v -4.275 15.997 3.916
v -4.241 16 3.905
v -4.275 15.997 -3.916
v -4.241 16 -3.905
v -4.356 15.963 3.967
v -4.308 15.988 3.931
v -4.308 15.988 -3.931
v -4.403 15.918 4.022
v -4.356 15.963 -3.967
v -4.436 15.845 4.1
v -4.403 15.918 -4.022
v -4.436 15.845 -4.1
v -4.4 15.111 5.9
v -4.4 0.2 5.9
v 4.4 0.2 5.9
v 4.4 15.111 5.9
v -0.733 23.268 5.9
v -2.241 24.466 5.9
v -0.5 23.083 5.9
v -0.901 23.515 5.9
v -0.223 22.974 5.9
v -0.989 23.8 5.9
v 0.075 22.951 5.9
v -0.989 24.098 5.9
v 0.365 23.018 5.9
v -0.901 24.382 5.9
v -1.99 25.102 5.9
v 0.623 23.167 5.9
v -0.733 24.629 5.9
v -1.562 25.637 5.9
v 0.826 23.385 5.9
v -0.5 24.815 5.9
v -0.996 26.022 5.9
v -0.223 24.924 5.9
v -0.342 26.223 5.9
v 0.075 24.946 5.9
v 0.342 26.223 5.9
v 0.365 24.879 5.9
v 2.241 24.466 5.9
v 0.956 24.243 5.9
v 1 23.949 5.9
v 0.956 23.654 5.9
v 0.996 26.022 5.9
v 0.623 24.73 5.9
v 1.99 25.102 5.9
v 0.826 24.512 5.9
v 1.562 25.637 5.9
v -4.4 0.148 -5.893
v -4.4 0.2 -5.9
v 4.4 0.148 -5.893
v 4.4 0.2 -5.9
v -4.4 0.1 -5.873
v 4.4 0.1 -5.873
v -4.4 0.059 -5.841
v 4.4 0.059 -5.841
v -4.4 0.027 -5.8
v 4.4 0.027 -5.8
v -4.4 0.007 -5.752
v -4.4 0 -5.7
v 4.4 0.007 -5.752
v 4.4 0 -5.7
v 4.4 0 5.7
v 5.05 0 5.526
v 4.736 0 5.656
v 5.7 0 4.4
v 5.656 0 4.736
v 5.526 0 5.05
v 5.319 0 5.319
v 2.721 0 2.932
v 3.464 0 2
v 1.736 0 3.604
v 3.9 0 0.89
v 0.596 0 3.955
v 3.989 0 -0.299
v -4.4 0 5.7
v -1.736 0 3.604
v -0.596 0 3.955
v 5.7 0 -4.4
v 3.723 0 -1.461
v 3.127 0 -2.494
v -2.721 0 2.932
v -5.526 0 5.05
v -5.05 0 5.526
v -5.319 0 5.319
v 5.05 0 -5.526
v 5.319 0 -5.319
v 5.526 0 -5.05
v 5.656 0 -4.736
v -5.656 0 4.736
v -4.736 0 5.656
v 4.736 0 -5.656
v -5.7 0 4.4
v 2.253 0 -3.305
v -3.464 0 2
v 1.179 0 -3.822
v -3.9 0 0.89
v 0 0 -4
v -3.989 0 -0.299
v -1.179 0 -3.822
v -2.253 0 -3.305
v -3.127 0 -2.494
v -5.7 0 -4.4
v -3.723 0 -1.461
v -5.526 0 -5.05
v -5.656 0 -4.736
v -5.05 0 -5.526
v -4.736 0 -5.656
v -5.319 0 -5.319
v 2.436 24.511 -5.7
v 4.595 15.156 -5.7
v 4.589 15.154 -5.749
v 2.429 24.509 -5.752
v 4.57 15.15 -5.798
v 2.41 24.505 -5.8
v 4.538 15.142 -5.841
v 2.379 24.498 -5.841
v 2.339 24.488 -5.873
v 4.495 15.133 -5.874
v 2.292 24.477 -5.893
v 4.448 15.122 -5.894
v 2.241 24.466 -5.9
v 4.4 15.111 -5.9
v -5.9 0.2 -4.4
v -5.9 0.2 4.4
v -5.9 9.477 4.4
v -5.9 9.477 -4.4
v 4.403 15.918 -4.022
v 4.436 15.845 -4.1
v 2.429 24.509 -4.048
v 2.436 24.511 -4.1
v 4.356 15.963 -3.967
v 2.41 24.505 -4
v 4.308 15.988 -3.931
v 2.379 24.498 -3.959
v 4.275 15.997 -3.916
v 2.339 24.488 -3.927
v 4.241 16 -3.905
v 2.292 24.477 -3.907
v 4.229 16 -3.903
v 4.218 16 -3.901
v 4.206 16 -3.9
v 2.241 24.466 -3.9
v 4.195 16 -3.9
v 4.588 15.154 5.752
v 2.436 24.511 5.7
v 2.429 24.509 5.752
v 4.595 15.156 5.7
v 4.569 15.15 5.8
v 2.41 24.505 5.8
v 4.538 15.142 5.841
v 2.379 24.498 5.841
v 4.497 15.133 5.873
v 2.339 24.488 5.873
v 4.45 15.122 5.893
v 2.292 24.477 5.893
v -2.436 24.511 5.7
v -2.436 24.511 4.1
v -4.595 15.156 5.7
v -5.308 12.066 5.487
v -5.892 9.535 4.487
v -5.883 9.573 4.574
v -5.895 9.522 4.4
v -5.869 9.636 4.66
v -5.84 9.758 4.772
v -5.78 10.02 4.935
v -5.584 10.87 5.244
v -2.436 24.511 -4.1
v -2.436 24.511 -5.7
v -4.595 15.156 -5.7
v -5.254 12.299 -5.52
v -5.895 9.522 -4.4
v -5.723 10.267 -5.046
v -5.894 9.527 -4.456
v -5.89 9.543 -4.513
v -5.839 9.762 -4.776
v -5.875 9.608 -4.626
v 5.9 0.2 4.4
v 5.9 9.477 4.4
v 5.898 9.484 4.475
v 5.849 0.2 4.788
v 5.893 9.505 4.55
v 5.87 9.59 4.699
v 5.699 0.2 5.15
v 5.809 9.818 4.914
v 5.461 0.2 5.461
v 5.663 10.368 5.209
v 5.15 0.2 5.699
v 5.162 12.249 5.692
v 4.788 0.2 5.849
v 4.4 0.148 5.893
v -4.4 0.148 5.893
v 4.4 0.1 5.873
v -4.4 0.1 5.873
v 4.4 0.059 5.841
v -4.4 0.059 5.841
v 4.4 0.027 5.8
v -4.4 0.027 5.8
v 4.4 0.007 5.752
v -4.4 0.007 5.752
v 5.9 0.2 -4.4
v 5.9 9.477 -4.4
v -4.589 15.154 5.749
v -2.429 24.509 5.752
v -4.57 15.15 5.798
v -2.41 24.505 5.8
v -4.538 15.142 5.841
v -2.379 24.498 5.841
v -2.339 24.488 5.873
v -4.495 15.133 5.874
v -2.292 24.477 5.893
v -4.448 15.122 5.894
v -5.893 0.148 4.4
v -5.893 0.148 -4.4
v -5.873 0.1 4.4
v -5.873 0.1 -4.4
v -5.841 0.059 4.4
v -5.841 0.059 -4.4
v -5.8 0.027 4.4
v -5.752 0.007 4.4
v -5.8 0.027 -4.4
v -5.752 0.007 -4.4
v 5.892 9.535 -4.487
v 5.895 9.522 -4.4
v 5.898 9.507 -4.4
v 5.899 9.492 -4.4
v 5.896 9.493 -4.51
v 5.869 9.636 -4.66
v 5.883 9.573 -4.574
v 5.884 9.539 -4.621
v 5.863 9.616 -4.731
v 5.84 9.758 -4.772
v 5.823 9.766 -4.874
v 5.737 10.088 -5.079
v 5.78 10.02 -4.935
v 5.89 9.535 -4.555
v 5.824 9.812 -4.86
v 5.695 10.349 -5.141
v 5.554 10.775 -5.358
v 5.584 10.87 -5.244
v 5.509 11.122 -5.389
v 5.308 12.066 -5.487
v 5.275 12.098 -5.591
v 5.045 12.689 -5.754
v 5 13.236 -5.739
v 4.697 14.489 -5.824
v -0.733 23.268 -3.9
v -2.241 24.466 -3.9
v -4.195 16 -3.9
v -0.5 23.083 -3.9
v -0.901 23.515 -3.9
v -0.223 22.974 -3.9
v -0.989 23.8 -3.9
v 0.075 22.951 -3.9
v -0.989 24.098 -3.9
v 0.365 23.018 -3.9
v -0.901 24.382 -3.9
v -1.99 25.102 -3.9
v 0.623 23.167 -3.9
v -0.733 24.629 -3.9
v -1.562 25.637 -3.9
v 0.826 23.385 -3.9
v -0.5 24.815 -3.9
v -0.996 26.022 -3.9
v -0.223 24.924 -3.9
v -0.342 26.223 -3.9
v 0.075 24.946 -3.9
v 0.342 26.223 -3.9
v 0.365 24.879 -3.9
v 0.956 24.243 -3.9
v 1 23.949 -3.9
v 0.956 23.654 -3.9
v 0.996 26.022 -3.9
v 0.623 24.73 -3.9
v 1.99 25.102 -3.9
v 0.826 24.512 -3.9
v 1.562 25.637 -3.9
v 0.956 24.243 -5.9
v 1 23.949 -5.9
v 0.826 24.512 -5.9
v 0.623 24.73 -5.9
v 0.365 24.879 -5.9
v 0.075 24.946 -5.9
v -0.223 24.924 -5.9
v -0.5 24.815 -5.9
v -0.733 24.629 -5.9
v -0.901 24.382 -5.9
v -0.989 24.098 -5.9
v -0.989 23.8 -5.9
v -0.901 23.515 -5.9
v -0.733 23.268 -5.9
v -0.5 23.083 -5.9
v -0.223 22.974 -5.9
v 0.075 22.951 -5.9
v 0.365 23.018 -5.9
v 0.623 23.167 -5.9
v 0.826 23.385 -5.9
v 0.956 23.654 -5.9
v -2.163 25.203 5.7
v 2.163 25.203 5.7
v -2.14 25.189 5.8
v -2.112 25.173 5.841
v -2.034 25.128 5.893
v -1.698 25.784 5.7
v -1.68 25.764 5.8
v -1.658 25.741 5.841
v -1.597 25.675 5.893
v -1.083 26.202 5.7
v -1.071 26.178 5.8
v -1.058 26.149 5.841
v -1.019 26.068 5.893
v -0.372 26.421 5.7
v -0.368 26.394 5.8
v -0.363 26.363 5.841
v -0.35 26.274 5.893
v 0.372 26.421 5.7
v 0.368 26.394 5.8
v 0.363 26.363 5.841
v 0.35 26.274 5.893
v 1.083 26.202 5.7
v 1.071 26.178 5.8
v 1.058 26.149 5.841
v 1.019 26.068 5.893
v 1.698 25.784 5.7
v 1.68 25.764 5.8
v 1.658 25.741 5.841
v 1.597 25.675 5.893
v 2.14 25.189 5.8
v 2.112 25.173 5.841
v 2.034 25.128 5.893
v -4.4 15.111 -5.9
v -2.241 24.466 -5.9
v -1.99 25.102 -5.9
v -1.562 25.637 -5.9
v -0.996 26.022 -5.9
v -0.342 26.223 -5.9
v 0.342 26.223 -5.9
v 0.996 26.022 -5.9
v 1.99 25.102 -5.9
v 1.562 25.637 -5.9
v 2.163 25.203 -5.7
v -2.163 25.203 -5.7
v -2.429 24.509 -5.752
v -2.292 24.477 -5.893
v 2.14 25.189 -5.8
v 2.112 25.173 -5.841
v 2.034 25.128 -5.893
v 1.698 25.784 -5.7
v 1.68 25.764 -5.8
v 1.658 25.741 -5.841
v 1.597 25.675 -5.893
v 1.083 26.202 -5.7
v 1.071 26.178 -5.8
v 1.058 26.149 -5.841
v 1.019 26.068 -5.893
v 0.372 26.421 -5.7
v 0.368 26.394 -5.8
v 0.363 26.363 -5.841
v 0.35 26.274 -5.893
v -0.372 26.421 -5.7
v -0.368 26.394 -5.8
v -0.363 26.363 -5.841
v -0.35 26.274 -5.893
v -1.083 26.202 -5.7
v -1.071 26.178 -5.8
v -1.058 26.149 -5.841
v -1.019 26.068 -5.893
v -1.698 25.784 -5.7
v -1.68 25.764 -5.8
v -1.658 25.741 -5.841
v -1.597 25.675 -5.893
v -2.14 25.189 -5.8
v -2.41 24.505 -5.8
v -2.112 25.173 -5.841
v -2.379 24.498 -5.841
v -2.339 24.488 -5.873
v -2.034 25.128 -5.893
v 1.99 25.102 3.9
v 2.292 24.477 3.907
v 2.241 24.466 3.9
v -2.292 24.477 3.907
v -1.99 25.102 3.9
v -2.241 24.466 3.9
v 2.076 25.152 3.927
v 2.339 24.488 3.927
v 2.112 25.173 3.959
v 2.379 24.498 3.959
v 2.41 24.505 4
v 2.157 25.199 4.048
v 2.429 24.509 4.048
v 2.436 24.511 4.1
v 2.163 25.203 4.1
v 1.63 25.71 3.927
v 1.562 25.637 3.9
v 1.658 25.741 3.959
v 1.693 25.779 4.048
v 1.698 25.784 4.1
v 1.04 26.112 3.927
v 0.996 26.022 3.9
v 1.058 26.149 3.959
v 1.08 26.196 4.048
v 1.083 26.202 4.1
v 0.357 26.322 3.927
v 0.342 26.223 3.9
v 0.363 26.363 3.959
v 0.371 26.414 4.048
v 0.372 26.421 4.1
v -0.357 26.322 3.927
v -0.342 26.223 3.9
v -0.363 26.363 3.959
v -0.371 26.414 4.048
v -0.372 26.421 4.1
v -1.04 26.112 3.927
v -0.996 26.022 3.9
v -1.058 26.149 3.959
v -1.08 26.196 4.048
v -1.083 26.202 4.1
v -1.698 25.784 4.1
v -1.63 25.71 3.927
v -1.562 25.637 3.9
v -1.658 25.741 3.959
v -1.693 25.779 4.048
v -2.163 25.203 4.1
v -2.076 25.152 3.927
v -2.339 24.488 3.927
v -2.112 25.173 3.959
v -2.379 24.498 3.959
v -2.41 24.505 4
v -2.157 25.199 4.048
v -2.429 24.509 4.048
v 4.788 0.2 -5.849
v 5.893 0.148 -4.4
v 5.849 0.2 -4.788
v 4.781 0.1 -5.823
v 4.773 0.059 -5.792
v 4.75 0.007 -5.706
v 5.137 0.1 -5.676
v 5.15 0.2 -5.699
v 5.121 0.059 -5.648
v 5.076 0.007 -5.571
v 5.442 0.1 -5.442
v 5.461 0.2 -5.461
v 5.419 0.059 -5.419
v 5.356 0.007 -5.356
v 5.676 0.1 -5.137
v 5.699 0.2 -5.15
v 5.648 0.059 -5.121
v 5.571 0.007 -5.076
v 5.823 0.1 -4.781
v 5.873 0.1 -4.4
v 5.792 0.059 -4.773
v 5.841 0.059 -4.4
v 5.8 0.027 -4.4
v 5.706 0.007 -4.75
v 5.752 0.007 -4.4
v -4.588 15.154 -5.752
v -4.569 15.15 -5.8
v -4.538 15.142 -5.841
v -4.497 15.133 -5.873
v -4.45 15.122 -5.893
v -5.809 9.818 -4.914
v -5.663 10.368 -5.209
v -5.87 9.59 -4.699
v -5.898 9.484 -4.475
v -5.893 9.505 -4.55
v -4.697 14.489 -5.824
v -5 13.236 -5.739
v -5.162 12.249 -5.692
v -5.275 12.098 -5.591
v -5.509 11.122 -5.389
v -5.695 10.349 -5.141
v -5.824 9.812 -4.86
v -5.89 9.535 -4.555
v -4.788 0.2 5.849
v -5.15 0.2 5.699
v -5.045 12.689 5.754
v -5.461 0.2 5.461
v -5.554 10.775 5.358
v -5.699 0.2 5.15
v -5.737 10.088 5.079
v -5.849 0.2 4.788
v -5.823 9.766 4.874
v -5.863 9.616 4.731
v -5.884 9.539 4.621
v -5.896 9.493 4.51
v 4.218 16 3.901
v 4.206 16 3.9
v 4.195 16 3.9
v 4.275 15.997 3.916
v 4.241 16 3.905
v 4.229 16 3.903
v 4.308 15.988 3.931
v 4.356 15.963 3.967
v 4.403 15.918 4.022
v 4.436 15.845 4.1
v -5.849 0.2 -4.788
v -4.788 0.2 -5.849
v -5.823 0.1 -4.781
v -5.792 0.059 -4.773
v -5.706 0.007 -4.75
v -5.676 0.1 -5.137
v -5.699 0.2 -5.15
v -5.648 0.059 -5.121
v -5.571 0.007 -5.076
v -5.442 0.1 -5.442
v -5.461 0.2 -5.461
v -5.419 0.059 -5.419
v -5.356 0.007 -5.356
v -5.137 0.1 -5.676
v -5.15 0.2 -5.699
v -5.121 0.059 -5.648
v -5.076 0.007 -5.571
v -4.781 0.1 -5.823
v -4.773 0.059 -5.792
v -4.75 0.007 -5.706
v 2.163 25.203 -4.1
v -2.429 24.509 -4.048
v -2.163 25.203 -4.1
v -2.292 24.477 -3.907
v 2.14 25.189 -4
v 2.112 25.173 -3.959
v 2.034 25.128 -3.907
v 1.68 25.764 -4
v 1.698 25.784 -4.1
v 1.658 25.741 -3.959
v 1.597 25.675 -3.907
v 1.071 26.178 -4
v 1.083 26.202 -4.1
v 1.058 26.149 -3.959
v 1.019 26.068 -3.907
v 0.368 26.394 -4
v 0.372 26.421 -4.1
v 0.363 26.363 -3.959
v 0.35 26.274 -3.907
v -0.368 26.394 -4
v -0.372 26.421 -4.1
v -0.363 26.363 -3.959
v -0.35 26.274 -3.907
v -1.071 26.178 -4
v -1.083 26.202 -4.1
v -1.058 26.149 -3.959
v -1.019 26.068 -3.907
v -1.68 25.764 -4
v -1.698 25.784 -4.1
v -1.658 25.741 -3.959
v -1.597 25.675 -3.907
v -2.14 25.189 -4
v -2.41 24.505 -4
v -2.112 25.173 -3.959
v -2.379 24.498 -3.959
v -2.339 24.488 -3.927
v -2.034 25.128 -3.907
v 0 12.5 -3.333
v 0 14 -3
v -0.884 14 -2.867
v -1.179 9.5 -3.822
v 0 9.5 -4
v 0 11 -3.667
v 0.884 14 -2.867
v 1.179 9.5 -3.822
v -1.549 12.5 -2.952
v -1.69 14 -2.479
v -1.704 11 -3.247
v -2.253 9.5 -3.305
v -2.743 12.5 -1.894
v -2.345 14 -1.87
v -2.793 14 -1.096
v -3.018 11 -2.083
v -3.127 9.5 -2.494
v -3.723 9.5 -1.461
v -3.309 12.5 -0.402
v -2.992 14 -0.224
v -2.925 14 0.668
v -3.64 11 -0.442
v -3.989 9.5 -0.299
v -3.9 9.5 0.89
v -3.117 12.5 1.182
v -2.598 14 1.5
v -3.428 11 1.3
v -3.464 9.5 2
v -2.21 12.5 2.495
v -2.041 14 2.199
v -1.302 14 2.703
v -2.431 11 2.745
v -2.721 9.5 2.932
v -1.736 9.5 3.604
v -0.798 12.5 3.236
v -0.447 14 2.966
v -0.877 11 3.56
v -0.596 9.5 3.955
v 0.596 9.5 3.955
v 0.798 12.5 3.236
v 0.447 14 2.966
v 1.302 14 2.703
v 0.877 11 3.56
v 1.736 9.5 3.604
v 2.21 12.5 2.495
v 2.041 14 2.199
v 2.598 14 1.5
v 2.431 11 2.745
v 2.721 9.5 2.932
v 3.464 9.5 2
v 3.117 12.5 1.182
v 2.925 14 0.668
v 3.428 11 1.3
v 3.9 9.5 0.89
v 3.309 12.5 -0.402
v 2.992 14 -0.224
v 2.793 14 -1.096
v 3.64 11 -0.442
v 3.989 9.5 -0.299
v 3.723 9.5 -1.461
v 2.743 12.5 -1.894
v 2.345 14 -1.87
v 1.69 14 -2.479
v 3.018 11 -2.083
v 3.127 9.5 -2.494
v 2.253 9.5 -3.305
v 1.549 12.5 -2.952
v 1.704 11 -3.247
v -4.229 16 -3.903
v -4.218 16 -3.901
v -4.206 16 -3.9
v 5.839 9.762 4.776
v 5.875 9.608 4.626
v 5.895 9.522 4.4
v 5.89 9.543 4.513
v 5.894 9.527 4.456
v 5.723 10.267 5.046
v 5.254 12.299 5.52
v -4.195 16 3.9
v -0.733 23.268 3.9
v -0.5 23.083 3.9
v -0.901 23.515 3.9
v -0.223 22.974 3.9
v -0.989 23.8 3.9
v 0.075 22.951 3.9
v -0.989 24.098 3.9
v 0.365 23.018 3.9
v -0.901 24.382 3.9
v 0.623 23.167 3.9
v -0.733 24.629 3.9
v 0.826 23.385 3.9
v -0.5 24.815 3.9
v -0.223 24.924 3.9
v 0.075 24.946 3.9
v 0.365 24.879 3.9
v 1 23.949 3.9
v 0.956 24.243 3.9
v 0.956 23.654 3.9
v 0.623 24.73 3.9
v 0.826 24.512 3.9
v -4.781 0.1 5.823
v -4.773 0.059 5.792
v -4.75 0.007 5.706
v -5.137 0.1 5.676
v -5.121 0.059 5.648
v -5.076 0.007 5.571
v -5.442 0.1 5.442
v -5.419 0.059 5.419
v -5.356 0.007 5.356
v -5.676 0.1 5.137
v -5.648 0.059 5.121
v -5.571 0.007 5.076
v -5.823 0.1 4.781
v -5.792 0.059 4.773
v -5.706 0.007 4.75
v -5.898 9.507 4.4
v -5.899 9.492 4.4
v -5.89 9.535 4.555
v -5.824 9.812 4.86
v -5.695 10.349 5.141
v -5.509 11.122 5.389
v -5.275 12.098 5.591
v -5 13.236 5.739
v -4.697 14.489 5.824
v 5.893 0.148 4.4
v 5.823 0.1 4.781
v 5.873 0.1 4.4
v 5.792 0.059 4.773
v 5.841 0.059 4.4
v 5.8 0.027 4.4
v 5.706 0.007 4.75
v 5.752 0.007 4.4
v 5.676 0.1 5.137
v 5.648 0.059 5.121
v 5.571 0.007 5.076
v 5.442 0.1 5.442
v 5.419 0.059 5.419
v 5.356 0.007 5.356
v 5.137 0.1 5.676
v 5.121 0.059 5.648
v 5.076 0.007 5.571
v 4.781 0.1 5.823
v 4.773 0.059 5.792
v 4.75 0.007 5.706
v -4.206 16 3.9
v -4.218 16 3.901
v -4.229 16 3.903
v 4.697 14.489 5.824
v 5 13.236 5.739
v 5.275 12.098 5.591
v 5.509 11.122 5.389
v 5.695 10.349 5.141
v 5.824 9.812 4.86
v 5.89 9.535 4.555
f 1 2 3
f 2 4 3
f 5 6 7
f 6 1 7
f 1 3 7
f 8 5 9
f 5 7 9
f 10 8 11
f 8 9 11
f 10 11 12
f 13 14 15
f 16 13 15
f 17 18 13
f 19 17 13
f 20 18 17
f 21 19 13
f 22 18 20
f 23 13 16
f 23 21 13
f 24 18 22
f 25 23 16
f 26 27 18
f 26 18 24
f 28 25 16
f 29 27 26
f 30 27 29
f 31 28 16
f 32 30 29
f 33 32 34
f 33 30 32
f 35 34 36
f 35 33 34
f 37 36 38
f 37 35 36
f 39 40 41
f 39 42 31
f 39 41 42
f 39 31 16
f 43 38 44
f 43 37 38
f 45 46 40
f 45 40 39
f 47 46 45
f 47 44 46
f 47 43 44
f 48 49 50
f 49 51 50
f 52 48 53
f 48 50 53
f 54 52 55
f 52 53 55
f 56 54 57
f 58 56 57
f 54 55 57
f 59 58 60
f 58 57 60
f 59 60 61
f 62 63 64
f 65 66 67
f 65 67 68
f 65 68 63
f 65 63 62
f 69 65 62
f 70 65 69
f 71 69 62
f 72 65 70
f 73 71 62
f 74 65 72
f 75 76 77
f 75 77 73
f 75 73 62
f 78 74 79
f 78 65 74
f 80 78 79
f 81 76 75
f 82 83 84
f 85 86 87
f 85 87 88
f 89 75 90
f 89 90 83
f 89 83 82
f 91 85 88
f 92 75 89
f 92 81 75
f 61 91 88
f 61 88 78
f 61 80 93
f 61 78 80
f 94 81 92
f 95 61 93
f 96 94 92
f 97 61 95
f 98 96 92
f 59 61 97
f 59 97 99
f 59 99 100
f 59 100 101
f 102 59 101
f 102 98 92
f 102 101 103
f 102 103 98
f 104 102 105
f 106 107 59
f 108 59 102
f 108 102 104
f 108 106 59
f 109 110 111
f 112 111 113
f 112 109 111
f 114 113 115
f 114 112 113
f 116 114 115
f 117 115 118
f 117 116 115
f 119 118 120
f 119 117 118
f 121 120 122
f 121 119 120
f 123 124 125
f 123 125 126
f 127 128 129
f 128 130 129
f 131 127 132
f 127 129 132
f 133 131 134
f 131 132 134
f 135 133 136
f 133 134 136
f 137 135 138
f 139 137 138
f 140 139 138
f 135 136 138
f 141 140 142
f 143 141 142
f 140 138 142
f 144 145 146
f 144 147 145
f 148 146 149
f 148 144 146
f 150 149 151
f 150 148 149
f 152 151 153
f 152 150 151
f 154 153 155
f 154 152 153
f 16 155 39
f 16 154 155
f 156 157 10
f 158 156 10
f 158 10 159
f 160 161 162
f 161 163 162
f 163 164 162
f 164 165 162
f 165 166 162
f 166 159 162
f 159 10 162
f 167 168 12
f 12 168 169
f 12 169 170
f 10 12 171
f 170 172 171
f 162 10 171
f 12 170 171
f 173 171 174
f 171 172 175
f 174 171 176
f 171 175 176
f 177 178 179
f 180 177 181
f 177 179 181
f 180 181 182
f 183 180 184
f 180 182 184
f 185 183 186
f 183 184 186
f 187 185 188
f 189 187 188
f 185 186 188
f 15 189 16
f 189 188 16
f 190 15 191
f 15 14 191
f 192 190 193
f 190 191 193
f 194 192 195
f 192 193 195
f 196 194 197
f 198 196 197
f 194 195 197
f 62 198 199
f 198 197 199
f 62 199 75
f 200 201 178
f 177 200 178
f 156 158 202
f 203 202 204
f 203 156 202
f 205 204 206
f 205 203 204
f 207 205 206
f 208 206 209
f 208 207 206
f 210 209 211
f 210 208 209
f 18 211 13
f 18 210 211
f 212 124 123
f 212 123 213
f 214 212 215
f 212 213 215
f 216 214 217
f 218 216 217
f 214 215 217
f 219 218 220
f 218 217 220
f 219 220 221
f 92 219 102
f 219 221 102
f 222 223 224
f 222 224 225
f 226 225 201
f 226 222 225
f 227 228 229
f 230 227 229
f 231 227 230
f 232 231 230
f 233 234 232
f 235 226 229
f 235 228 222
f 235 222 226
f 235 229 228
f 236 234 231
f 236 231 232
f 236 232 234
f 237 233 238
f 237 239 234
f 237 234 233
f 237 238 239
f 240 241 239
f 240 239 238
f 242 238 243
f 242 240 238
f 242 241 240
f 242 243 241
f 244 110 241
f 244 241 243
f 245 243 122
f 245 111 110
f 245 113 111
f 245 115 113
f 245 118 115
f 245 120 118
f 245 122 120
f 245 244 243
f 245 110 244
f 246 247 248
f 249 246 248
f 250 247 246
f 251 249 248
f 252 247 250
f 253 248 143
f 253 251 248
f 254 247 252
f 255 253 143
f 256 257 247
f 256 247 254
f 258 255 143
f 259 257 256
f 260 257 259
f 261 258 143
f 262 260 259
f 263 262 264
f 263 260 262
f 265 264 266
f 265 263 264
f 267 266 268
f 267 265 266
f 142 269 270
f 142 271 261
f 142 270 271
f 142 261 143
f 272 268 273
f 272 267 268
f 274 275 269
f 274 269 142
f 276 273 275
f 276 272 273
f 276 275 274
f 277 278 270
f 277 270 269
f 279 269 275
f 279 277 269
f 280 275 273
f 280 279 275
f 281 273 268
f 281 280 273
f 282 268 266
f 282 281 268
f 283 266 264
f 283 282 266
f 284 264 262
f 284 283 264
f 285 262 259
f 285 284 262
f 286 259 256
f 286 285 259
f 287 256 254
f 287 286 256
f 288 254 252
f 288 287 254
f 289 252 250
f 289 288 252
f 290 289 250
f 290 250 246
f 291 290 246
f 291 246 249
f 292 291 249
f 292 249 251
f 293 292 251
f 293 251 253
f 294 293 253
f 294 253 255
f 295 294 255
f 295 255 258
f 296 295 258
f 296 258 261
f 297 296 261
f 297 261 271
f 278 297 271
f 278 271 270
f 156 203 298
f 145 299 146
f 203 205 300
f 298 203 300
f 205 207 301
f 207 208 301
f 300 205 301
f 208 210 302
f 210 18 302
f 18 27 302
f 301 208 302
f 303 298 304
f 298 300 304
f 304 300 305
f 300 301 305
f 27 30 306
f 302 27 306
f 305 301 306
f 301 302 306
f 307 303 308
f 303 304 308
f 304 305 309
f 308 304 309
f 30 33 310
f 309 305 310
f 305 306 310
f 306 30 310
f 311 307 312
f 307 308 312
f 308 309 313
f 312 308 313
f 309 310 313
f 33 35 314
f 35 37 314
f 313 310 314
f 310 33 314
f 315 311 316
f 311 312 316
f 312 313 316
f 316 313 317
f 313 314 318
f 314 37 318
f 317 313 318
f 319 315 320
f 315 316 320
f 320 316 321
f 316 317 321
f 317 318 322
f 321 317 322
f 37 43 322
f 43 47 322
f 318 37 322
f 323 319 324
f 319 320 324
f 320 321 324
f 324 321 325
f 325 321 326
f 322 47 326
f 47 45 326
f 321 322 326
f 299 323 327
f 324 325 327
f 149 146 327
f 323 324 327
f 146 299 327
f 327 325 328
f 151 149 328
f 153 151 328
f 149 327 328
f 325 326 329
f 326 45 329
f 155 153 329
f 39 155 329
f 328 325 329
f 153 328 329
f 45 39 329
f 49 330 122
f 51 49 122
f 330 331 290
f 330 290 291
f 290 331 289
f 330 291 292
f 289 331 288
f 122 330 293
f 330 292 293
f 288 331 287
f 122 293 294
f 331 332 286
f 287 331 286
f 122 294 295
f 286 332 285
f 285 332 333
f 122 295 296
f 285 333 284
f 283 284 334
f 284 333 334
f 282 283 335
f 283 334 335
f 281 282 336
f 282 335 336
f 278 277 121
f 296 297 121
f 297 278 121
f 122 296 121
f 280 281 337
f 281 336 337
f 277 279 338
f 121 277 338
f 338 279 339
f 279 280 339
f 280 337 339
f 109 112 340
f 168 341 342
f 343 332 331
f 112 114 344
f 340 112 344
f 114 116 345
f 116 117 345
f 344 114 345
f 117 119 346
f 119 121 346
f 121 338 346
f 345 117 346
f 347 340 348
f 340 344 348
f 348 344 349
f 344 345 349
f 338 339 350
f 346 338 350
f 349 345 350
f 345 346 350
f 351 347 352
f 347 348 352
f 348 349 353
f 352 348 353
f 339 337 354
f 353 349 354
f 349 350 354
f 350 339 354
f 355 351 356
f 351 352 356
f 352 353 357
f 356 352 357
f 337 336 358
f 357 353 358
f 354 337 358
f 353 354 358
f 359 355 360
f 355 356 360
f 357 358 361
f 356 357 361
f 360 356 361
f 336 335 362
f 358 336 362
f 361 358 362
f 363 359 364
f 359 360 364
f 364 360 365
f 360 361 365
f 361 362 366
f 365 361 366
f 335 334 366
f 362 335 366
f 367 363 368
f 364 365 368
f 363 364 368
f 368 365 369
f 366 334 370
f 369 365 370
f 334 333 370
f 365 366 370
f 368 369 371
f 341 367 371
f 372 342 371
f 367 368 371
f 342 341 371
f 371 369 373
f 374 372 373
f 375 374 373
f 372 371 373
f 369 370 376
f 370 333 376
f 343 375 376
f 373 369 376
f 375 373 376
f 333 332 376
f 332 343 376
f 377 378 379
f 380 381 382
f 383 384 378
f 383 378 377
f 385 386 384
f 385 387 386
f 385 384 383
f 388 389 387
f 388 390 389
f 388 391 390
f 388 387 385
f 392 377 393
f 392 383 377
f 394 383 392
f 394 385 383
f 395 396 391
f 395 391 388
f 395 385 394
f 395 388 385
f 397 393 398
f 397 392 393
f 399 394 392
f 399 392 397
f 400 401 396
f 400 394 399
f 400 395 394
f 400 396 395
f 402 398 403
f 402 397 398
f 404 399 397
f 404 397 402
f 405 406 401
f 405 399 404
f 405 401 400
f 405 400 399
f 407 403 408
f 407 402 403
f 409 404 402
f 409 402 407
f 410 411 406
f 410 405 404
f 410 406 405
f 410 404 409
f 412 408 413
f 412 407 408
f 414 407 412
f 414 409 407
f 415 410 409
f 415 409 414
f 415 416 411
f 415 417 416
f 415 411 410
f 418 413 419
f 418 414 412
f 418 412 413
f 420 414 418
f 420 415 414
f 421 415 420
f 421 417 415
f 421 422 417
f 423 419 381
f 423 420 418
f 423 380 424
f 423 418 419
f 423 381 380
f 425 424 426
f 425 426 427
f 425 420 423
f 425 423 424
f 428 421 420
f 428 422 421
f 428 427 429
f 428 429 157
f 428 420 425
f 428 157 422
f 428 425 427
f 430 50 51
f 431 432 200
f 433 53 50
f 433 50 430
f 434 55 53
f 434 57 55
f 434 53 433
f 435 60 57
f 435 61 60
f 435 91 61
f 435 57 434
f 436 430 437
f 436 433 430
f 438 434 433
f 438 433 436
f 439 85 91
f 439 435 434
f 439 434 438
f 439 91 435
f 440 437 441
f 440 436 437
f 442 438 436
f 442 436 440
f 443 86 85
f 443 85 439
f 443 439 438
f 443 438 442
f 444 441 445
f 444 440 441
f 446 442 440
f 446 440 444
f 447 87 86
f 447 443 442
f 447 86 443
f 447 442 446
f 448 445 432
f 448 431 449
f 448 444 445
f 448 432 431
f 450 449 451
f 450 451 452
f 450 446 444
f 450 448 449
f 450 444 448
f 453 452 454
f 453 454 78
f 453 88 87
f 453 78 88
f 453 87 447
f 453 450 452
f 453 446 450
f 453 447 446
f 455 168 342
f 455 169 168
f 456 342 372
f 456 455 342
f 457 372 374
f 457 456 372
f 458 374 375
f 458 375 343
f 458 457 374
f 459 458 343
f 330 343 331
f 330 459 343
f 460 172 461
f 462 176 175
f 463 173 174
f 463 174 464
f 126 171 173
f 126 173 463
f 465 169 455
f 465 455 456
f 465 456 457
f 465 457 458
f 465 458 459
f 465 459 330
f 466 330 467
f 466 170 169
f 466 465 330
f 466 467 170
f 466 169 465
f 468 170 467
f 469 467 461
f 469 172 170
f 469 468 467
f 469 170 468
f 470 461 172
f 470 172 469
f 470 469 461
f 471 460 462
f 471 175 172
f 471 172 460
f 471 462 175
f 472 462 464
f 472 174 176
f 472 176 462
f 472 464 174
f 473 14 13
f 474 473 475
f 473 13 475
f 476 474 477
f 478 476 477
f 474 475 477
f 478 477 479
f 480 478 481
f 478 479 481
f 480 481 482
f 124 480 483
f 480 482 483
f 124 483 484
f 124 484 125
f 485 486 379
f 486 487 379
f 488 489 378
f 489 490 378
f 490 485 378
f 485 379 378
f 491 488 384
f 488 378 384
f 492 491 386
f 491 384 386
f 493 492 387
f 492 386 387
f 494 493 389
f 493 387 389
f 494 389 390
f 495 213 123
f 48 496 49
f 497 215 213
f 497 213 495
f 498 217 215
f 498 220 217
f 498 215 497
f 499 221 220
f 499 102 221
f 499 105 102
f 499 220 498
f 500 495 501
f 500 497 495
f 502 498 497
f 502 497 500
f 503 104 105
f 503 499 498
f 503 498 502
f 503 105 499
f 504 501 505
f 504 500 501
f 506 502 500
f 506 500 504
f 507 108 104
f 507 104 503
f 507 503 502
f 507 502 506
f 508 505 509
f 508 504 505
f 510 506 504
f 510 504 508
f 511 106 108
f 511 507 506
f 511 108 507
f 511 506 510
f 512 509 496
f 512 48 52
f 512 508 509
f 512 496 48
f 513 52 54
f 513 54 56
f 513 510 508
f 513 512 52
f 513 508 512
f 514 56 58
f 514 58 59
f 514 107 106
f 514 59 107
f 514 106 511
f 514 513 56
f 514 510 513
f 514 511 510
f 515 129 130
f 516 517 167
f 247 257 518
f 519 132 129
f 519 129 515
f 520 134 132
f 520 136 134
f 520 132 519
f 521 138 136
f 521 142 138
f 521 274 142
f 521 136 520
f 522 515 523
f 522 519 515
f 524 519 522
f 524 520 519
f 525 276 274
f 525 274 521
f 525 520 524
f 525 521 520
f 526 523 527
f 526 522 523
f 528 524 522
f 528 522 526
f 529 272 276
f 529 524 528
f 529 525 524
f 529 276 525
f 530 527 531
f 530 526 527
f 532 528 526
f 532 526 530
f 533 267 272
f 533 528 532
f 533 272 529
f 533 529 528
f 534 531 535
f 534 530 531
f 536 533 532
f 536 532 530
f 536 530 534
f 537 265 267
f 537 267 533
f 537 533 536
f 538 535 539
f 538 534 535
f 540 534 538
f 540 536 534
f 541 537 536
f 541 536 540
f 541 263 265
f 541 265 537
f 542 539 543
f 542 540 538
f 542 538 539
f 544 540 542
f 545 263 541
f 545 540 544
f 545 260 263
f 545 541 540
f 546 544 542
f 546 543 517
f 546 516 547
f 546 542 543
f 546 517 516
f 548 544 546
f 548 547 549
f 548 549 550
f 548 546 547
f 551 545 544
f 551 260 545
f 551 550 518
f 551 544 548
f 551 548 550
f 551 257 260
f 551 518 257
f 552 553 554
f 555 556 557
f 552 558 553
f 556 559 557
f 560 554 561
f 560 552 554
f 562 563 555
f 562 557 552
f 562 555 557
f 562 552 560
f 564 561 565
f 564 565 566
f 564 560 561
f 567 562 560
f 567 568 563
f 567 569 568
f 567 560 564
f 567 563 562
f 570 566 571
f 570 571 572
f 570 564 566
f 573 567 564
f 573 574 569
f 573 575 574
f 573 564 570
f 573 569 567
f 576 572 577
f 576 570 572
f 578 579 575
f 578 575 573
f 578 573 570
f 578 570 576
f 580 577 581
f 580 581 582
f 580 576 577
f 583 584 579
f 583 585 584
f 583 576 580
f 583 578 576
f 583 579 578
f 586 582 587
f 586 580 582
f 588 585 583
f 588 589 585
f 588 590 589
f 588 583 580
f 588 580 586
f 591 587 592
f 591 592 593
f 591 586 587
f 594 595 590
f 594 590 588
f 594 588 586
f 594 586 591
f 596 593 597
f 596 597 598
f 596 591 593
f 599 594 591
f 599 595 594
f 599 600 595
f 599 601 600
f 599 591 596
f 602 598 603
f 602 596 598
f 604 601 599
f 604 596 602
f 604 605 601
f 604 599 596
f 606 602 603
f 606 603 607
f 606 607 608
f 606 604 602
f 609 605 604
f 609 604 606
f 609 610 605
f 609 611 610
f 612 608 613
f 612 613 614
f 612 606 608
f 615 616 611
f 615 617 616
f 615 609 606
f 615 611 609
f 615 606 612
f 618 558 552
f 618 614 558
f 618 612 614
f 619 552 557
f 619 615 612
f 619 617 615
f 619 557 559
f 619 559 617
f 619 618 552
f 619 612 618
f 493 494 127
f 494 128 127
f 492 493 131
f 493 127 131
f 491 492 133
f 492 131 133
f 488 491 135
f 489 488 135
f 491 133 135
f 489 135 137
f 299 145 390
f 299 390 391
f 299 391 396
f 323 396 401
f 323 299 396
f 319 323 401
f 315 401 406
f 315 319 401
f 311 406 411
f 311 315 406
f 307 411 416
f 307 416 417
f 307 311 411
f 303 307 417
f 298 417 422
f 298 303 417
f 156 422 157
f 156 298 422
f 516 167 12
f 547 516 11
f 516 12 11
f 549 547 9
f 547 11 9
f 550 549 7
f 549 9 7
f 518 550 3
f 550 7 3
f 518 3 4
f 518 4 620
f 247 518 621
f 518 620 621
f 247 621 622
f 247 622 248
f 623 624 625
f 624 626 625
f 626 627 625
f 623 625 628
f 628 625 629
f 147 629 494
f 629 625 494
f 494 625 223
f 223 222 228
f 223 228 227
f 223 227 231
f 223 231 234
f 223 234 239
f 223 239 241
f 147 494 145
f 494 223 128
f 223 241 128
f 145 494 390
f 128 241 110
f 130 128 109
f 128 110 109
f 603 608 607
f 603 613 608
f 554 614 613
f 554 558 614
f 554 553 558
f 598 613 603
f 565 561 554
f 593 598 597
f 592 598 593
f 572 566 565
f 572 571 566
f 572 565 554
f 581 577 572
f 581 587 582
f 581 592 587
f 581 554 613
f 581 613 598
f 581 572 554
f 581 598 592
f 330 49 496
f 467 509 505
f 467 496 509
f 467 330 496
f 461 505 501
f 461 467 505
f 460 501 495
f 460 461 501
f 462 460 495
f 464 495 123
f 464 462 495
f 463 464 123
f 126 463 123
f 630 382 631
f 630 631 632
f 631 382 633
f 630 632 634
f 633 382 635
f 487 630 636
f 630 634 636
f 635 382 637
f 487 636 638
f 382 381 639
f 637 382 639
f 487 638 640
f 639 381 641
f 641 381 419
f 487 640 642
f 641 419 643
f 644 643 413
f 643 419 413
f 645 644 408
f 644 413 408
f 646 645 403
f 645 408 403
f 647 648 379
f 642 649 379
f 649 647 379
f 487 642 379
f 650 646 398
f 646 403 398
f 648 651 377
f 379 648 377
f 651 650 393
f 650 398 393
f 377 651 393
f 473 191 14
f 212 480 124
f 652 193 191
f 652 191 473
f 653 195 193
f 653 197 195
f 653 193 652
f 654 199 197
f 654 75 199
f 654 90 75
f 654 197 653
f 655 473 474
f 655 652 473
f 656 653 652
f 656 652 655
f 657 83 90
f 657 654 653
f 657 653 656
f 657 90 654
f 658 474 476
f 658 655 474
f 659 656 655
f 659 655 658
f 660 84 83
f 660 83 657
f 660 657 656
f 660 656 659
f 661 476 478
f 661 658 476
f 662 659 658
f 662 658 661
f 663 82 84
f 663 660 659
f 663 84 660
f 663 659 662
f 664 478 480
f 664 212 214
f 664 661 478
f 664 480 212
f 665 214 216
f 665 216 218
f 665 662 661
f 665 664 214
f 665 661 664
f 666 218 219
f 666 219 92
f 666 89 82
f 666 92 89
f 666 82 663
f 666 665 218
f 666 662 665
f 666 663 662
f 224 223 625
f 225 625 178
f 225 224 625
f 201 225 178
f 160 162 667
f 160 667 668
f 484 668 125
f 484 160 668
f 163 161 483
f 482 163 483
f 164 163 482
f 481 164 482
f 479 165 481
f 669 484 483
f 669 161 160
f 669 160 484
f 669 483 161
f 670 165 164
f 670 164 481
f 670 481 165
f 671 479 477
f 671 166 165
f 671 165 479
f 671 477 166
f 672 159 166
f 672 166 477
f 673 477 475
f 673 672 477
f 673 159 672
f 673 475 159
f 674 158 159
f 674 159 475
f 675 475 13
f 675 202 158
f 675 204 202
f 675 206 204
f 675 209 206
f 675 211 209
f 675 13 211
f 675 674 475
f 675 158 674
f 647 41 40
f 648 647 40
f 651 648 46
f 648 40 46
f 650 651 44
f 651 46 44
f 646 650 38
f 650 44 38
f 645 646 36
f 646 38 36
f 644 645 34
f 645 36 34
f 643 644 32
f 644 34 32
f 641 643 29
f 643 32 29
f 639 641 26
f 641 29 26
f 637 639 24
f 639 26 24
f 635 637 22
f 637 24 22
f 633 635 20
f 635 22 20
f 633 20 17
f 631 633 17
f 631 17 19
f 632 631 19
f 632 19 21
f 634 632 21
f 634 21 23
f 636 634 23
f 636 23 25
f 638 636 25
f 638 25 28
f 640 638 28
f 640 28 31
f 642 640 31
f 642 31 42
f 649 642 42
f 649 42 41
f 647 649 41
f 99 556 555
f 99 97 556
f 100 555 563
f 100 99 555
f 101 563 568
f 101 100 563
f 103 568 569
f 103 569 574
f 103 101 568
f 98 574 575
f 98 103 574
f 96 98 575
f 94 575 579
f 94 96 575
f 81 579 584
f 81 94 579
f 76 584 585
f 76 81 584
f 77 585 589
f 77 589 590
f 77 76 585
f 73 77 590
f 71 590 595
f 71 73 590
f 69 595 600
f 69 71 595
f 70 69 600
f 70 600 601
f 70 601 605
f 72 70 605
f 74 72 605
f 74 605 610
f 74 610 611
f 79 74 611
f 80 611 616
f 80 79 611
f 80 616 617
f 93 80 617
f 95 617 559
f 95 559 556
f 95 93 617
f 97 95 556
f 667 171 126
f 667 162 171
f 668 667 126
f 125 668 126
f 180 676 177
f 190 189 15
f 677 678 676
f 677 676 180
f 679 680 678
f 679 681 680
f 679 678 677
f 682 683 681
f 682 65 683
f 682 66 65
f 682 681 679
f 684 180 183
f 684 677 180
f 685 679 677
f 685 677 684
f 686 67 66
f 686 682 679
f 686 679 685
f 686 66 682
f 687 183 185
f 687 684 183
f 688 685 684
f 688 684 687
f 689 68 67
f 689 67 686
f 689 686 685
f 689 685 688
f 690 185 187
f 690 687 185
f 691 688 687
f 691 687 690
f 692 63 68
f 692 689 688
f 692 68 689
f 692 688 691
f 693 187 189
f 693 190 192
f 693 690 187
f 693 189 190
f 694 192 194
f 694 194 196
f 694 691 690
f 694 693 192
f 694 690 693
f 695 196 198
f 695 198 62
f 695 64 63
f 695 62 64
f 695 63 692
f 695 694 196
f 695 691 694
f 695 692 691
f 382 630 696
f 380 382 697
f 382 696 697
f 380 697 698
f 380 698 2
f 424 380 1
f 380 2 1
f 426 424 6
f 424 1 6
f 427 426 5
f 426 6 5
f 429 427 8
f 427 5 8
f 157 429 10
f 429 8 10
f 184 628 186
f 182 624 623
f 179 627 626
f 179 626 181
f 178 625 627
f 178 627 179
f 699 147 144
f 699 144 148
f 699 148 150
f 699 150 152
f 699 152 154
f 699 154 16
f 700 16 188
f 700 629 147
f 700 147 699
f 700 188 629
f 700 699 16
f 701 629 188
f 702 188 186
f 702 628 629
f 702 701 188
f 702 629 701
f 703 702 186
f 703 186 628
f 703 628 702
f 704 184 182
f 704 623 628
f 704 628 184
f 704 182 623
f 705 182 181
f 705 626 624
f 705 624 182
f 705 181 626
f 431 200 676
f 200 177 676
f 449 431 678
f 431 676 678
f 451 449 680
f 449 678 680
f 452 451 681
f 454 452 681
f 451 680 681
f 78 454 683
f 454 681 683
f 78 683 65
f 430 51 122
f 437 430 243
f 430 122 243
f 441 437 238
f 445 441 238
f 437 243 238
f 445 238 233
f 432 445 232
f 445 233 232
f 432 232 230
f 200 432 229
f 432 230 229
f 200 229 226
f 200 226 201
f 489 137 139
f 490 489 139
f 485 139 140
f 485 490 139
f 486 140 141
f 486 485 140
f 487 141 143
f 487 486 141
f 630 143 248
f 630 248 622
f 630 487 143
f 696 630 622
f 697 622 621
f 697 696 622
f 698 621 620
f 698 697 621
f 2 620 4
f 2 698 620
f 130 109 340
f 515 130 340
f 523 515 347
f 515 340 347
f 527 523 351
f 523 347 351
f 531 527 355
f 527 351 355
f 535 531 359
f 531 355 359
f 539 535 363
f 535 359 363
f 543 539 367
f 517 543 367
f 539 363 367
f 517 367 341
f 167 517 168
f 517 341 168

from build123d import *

# Parameters (mm, degrees)
EXTRUDE_1_DEPTH     = 9.5
EXTRUDE_2_DEPTH     = 11.8
EXTRUDE_3_DEPTH     = 2
CUT_EXTRUDE_1_REACH = 31.556
SKETCH_4_R          = 1.0000000000000002
FILLET_1_R          = 1.5
FILLET_2_R          = 0.2


with BuildPart() as part:
    # 草图1 → 凸台-拉伸1 (new body)
    with BuildSketch(Plane(origin=(0, 0, 0), x_dir=(1, 0, 0), z_dir=(0, 1, 0))):
        Polygon((5.899999999999999, 5.9), (5.9, -5.9), (-5.9, -5.900000000000002), (-5.900000000000002, 5.899999999999999), align=None)
    extrude(amount=EXTRUDE_1_DEPTH)

    # 草图2 → 凸台-拉伸2 (add)
    with BuildSketch(Plane.XY.offset(5.900000000000001)):
        Polygon((-5.900000000000001, 9.5), (5.8999999999999995, 9.5), (4.3999999999999995, 16), (-4.400000000000001, 16), align=None)
    extrude(amount=-EXTRUDE_2_DEPTH)

    # 草图3 → 凸台-拉伸3 (add)
    with BuildSketch(Plane.XY.offset(5.900000000000001)):
        with BuildLine():
            Line((-4.400000000000001, 16), (4.3999999999999995, 16))
            Line((4.3999999999999995, 16), (2.435977989236515, 24.510762046641762))
            ThreePointArc((2.435977989236515, 24.510762046641762), (-4.169e-14, 26.448613279894865), (-2.435977989236587, 24.510762046641744))
            Line((-2.435977989236587, 24.510762046641744), (-4.400000000000001, 16))
        make_face()
    extrude_3 = extrude(amount=-EXTRUDE_3_DEPTH)

    # 草图4 → 切除-拉伸1 (cut, up to next)
    with BuildSketch(Plane.XY.offset(5.900000000000001), mode=Mode.PRIVATE) as cut_extrude_1_sk1:
        with Locations((-3.296e-14, 23.948613279894865)):
            Circle(SKETCH_4_R)
    cut_extrude_1_tool1 = extrude(cut_extrude_1_sk1.sketch, amount=-CUT_EXTRUDE_1_REACH, mode=Mode.PRIVATE) & part.part
    cut_extrude_1 = cut_extrude_1_tool1.solids().sort_by_distance((0, 23.948613, 5.9))[0]
    add(cut_extrude_1, mode=Mode.SUBTRACT)

    # 镜向1: 凸台-拉伸3, 切除-拉伸1 across plane
    add(extrude_3.mirror(Plane.XY))
    add(cut_extrude_1.mirror(Plane.XY), mode=Mode.SUBTRACT)

    # 草图5 → 切除-旋转1 (revolve, cut)
    with BuildSketch(Plane.XY, mode=Mode.PRIVATE) as cut_revolve_1_sk:
        Polygon((0, 0), (0, 14), (3, 14), (3.999999999999999, 9.5), (4, 0), align=None)
    revolve(cut_revolve_1_sk.sketch.rotate(Axis((0, 0, 0), (0, 1, 0)), 90), axis=Axis((0, 0, 0), (0, 1, 0)), mode=Mode.SUBTRACT)

    # 圆角1
    fillet_1_edges = [part.edges().sort_by_distance(p)[0] for p in [
        (5.899999999999999, 4.75, -5.9),
        (5.9, 4.75, 5.9),
        (-5.9, 4.75, 5.900000000000002),
        (-5.900000000000002, 4.75, -5.899999999999999),
    ]]
    fillet(fillet_1_edges, radius=FILLET_1_R)

    # 圆角2
    fillet_2_edges = [part.edges().sort_by_distance(p)[0] for p in [
        (3.417988994618258, 20.25538102332088, 5.900000000000001),
        (5.19350478455585, 12.56147926692465, 5.672929753319866),
        (5.8999999999999995, 9.5, -8.9e-16),
        (5.193504784555849, 12.561479266924657, -5.672929753319866),
        (3.4179889946182564, 20.255381023320886, -5.9),
        (-4.254e-14, 26.448613279894865, -5.900000000000001),
        (-4.254e-14, 26.448613279894865, -3.9000000000000012),
        (-3.417988994618308, 20.255381023320872, -5.9),
        (-5.193504714374944, 12.561479571041913, -5.672929797068456),
        (-5.900000000000001, 9.5, 1.78e-15),
        (-5.193504714374941, 12.561479571041922, 5.672929797068459),
        (-3.4179889946183075, 20.255381023320876, 5.900000000000001),
        (0, 0, 5.900000000000001),
        (5.460660171779821, 0, 5.460660171779821),
        (5.8999999999999995, 0, 0),
        (5.4606601717798195, 0, -5.460660171779821),
        (-1.78e-15, 0, -5.8999999999999995),
        (-5.460660171779823, 0, -5.4606601717798195),
        (-5.900000000000001, 0, 1.78e-15),
        (-4.254e-14, 26.448613279894865, 5.900000000000001),
        (-4.254e-14, 26.448613279894865, 3.9000000000000012),
        (-5.460660171779821, 0, 5.460660171779823),
        (3.4179889946182582, 20.25538102332088, 3.9000000000000012),
        (-3.4179889946182938, 20.255381023320872, -3.9000000000000012),
        (3.4179889946182582, 20.25538102332088, -3.9000000000000012),
        (4.4, 16, 0),
        (-3.4179889946182933, 20.255381023320872, 3.9000000000000012),
        (-4.4, 16, 0),
    ]]
    fillet(fillet_2_edges, radius=FILLET_2_R)


solid = part.part
